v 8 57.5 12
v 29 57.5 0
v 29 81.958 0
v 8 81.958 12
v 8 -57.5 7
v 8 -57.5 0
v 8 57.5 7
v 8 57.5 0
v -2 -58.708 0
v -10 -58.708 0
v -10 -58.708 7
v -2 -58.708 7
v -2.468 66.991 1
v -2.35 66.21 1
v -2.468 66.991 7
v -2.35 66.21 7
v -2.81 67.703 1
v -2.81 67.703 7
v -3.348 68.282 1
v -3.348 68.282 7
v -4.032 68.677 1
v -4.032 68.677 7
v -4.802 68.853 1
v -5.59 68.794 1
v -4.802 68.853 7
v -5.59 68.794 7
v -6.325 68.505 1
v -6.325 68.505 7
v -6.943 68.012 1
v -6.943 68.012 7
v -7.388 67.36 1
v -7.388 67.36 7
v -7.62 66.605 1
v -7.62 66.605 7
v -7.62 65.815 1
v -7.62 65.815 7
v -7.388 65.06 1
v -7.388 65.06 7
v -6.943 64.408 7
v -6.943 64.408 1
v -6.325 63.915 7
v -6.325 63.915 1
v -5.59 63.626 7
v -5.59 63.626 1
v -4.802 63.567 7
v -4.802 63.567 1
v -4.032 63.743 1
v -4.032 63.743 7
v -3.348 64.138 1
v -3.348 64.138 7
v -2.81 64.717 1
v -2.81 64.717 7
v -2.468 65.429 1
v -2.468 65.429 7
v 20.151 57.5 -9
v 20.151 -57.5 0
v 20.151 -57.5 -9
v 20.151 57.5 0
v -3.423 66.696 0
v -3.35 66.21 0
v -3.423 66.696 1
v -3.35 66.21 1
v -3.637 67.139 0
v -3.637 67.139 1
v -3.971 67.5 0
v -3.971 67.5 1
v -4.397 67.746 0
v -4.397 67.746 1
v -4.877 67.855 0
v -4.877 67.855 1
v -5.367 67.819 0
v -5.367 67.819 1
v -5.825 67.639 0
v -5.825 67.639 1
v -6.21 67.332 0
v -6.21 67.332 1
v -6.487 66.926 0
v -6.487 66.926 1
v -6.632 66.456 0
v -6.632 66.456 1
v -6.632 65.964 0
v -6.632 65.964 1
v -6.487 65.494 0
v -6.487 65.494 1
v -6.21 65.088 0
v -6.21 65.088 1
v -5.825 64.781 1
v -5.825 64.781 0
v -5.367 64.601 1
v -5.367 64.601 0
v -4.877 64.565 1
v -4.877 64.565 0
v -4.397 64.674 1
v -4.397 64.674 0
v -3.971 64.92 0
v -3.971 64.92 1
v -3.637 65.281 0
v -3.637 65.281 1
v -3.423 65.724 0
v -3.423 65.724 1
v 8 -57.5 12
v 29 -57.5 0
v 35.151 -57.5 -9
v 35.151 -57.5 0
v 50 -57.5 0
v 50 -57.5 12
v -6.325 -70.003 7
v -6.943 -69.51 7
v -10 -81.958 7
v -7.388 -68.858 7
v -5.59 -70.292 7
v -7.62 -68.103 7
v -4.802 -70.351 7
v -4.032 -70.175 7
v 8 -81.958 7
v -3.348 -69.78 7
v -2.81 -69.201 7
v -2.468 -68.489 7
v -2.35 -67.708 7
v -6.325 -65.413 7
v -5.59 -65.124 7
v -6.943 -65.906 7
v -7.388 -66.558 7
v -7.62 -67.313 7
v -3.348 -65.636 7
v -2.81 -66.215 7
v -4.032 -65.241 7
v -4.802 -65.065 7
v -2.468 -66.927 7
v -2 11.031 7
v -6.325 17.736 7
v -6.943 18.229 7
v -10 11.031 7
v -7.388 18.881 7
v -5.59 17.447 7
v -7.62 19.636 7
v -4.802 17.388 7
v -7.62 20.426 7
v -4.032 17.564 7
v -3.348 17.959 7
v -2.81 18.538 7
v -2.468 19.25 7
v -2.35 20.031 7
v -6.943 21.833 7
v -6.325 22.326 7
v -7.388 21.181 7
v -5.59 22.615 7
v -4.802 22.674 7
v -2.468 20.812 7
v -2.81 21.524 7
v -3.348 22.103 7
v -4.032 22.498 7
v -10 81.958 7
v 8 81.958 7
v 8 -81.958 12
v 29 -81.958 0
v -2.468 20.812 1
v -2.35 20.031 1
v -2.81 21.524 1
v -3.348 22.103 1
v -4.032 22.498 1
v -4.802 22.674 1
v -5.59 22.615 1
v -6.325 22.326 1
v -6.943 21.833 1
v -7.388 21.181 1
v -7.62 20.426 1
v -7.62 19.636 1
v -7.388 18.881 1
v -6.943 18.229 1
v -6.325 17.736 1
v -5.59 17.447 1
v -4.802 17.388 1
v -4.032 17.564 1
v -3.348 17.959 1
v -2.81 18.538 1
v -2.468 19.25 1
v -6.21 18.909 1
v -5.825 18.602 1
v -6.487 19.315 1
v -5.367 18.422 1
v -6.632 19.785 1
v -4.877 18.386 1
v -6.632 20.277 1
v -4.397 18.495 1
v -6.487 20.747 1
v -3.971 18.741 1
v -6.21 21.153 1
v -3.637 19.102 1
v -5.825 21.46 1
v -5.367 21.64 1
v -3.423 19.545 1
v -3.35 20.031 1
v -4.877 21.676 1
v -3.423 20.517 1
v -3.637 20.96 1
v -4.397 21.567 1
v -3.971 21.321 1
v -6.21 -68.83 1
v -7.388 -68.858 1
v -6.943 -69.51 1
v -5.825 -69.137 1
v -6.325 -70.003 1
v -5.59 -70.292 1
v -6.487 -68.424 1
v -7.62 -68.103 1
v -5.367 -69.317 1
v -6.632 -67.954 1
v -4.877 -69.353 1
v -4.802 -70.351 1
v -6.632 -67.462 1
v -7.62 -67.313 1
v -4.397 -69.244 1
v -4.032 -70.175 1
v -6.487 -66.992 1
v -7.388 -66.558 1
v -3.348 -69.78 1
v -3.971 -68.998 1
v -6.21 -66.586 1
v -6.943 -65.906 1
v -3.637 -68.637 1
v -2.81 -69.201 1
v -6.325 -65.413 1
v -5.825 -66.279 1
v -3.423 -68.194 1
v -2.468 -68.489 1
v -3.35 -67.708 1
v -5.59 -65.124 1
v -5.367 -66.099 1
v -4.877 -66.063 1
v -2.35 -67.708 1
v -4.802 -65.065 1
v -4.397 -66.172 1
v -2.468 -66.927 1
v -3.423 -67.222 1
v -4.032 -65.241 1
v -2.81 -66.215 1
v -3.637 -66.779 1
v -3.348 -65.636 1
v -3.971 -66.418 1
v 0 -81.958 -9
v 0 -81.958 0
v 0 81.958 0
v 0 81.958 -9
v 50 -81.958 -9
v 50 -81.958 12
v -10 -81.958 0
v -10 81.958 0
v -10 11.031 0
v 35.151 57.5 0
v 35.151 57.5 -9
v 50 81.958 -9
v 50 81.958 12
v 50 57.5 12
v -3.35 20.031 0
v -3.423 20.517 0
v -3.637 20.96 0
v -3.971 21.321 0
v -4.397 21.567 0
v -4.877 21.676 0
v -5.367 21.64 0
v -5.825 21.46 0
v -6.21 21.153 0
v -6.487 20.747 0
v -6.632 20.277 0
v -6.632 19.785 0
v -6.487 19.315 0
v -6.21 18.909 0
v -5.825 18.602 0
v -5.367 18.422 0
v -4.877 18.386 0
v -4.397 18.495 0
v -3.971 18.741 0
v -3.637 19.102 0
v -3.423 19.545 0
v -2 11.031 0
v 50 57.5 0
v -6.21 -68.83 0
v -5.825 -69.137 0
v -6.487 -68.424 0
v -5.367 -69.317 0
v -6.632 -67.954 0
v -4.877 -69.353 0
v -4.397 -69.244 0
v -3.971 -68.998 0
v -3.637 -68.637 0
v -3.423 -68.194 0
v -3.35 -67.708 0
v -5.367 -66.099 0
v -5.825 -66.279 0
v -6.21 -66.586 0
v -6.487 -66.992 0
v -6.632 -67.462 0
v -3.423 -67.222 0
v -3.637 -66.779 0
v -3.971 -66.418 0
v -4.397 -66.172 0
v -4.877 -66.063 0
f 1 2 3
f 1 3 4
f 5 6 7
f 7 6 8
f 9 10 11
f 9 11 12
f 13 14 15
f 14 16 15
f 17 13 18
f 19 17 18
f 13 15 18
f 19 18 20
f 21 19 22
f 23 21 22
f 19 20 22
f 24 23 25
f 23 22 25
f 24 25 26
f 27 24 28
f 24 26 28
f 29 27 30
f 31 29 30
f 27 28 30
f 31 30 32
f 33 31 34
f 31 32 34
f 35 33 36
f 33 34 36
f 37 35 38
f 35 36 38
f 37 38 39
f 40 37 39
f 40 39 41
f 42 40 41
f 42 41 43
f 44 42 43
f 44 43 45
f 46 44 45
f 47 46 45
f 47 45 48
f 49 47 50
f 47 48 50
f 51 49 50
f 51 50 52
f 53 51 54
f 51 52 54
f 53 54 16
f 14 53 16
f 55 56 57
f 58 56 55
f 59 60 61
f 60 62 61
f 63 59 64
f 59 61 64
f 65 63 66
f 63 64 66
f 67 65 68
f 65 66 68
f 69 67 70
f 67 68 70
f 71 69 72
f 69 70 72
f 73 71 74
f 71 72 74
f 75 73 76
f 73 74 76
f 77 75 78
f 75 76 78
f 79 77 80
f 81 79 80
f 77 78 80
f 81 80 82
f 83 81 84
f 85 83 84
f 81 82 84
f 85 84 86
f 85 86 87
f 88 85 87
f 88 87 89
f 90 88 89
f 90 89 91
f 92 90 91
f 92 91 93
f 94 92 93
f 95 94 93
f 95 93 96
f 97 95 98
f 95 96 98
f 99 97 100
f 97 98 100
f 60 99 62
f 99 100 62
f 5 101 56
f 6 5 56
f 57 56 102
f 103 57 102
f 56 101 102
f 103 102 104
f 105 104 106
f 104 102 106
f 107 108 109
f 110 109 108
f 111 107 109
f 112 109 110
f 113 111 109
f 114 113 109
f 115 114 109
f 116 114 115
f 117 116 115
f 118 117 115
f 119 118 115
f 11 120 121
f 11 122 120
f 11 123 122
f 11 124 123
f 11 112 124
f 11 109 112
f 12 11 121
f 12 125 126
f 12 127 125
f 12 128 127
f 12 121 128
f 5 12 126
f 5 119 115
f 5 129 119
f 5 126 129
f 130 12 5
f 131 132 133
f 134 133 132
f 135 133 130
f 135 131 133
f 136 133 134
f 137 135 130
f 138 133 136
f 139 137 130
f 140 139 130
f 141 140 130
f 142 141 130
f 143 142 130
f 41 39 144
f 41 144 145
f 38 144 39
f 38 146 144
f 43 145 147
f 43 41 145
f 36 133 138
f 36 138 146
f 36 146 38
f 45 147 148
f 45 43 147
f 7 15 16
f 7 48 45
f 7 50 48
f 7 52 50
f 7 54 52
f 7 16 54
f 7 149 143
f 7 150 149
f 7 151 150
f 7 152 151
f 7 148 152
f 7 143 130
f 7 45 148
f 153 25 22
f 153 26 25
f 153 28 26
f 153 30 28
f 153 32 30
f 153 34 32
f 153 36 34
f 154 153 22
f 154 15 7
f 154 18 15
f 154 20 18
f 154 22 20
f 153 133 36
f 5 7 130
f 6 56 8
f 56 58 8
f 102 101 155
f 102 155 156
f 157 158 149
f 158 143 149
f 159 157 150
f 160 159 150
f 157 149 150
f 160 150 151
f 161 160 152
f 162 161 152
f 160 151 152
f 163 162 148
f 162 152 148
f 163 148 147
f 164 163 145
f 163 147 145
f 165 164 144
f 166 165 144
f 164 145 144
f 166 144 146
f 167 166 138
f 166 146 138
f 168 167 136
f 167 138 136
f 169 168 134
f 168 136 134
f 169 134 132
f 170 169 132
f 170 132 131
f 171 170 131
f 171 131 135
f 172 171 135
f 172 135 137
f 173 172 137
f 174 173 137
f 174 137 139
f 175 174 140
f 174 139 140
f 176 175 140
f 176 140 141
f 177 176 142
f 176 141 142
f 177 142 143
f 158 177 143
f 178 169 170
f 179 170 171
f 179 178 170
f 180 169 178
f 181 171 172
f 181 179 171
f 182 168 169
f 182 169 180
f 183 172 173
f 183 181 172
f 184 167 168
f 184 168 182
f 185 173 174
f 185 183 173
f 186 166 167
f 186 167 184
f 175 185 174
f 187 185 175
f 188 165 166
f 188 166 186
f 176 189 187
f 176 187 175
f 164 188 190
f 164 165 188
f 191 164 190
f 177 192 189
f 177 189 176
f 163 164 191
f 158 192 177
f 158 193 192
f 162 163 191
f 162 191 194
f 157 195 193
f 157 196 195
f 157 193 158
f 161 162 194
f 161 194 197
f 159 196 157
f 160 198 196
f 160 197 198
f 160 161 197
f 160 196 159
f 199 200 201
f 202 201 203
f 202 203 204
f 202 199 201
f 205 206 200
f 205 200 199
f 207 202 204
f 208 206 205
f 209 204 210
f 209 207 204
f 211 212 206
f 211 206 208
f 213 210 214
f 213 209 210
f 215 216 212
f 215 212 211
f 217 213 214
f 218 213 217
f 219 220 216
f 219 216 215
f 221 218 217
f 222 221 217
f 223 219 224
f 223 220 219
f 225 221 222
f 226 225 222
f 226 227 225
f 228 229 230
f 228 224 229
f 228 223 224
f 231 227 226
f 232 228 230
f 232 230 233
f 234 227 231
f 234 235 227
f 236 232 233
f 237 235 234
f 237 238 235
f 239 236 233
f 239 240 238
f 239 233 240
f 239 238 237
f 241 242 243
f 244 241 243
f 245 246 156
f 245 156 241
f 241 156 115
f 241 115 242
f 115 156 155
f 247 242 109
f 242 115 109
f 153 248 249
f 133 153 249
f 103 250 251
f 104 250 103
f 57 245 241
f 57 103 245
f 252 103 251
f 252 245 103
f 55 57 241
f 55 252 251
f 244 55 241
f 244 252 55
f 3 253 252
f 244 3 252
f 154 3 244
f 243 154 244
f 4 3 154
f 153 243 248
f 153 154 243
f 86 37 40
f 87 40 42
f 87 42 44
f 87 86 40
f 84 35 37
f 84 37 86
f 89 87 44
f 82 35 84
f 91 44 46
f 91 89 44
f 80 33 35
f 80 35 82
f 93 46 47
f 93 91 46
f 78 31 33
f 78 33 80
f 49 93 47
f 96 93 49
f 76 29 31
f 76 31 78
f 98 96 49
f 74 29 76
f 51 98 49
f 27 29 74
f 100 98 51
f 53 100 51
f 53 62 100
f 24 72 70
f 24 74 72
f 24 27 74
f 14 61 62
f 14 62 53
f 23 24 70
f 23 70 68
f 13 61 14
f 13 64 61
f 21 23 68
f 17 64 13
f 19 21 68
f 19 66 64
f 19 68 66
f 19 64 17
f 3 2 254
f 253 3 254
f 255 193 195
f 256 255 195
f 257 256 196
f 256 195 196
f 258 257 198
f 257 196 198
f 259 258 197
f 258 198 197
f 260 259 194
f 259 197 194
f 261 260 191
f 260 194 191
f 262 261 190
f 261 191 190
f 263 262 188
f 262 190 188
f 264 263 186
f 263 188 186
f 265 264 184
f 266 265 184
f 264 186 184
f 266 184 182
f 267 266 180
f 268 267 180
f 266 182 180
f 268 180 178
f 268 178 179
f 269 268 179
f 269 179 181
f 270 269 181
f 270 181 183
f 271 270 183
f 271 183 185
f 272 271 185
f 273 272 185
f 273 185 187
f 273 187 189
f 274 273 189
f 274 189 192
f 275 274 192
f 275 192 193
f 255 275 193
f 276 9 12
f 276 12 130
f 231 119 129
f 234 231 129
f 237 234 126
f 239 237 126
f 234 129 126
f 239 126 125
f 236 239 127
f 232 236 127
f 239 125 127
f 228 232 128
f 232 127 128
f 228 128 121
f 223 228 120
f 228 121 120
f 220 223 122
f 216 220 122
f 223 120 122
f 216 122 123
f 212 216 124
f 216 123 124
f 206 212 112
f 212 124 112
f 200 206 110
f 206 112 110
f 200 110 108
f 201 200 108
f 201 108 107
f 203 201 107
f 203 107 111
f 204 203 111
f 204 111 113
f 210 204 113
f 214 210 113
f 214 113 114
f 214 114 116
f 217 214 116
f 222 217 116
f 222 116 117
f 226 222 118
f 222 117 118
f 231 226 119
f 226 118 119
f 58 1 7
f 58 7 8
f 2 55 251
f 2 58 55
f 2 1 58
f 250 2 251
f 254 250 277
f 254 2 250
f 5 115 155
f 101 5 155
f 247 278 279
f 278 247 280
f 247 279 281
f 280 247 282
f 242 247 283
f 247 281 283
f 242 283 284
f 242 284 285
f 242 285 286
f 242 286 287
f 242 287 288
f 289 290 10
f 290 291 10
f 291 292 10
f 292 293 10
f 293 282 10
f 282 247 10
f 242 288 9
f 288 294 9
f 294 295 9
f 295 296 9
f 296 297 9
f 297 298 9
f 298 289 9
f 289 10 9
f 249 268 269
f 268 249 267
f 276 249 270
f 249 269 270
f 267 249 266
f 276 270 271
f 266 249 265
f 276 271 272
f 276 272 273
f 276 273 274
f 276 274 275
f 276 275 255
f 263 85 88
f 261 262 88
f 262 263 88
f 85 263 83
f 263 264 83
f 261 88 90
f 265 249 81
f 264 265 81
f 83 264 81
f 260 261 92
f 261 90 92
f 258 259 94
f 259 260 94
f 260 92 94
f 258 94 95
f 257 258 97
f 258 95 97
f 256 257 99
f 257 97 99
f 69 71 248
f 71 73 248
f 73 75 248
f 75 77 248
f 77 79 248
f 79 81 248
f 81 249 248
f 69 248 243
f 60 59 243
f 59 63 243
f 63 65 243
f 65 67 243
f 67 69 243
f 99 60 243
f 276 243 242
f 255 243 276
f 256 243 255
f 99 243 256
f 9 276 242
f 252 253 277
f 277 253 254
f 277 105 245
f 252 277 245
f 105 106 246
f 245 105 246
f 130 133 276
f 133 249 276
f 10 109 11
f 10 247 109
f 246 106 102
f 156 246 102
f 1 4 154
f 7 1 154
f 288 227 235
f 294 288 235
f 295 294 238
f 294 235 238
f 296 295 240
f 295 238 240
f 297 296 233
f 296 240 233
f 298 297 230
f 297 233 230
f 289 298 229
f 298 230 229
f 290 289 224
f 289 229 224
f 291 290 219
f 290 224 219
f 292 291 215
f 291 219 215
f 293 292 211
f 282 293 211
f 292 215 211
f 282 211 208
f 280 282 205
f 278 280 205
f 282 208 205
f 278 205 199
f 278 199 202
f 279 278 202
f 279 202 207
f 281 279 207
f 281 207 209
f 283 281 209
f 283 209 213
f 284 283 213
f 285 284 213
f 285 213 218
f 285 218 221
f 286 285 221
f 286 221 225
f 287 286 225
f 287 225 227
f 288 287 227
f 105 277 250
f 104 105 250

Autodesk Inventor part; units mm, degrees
ref_plane "YZ Plane" through (0, 0, 0) normal (1, 0, 0) x (0, 1, 0)
ref_plane "XZ Plane" through (0, 0, 0) normal (0, 1, 0) x (-1, 0, 0)
ref_plane "XY Plane" through (0, 0, 0) normal (0, 0, 1) x (1, 0, 0)
sketch "Sketch1" plane through (0, 0, 0) normal (0, 0, 1) x (1, 0, 0)
  line L0 (0, 0) -> (0, 81.958)
  line L1 (0, 0) -> (0, -81.958)
  line L2 (0, -81.958) -> (-10, -81.958)
  line L3 (-5, -81.958) -> (-5, -67.708) construction
  line L4 (-5, -67.708) -> (-5, -58.708) construction
  line L5 (-10, -81.958) -> (-10, -58.708)
  line L6 (-10, -58.708) -> (0, -58.708)
  line L7 (0, 81.958) -> (-10, 81.958)
  line L8 (-5, 81.958) -> (-5, 66.21) construction
  line L9 (-5, 66.21) -> (-5, 20.031) construction
  line L10 (-5, 20.031) -> (-5, 11.031) construction
  line L11 (-10, 81.958) -> (-10, 11.031)
  line L12 (-10, 11.031) -> (0, 11.031)
  line L13 (0, -58.708) -> (-2, -58.708)
  line L14 (-2, -58.708) -> (-2, 11.031)
  line L15 (0, -81.958) -> (8, -81.958)
  line L16 (8, -81.958) -> (8, 81.958)
  line L17 (8, 81.958) -> (0, 81.958)
  line L18 (0, 81.958) -> (0, -81.958)
  dimension "d0" = 81.958
  dimension "d2" = 163.916
  dimension "d3" = 10
  dimension "d4" = 14.25
  dimension "d5" = 9
  dimension "d6" = 15.748
  dimension "d7" = 46.179
  dimension "d8" = 9
  dimension "d9" = 2
  dimension "d10" = 8
extrude "Extrusion1" add sketch "Sketch1" along normal blind 7
sketch "Sketch2" plane through (0, 0, 0) normal (0, 0, -1) x (-1, 0, 0)
  line L0 (10, 81.958) -> (10, 11.031) construction
  line L1 (10, 46.4945) -> (0, 46.4945) construction
  line L2 (-8, 81.958) -> (10, 81.958) projected
  line L3 (0, 81.958) -> (-50, 81.958)
  line L4 (-50, 81.958) -> (-50, -81.958)
  line L5 (-50, -81.958) -> (0, -81.958)
  line L6 (0, -81.958) -> (0, 81.958)
  line L7 (-35.1508, -57.5) -> (-20.1508, -57.5)
  line L8 (-20.1508, -57.5) -> (-20.1508, 57.5)
  line L9 (-20.1508, 57.5) -> (-35.1508, 57.5)
  line L10 (-35.1508, 57.5) -> (-35.1508, -57.5)
  line L11 (-35.1508, -57.5) -> (-20.1508, 57.5) construction
  line L12 (-20.1508, -57.5) -> (-35.1508, 57.5) construction
  point P0 (0, 0)
  point P1 (-27.6508, 0)
  dimension "d13" = 10
  dimension "d14" = 50
  dimension "d15" = 15
  dimension "d16" = 115
extrude "Extrusion2" add sketch "Sketch2" along normal blind 9
sketch "Sketch3" plane through (-10, -81.958, 7) normal (0, -1, 0) x (1, 0, 0)
  line L0 (60, -7) -> (18, -7) projected
  line L1 (60, -7) -> (60, 5)
  line L2 (0, 0) -> (18, 0) projected
  line L3 (18, 5) -> (18, 0)
  line L4 (60, 5) -> (39, -7)
  line L5 (18, 5) -> (39, -7)
  line L6 (18, -7) -> (18, 0) projected
  line L7 (18, 0) -> (18, -7)
  point P0 (10, -7)
  dimension "d19" = 12
extrude "Extrusion3" add sketch "Sketch3" against normal up to surface (24.458 mm away)
mirror "Mirror1" about plane through (0, 0, 0) normal (0, 1, 0) of "Extrusion3"
sketch "Sketch4" plane through (0, 0, 7) normal (0, 0, 1) x (1, 0, 0)
  line L0 (-5, -81.958) -> (-5, -67.708) construction
  line L1 (-5, 81.958) -> (-5, 66.21) construction
  line L2 (-5, 66.21) -> (-5, 20.031) construction
  circle A0 centre (-5, -67.708) radius 1.65
  circle A1 centre (-5, 20.031) radius 1.65
  circle A2 centre (-5, 66.21) radius 1.65
  point P0 (0, 0)
  dimension "d22" = 14.25
  dimension "d23" = 46.179
  dimension "d24" = 15.748
  dimension "d25" = 3.3
extrude "Extrusion4" cut sketch "Sketch4" against normal up to surface (7 mm away)
sketch "Sketch5" plane through (0, 0, 7) normal (0, 0, 1) x (1, 0, 0)
  circle A0 centre (-5, -67.708) radius 1.65 projected
  circle A1 centre (-5, -67.708) radius 2.65
  circle A2 centre (-5, 20.031) radius 1.65 projected
  circle A3 centre (-5, 20.031) radius 2.65
  circle A4 centre (-5, 66.21) radius 1.65 projected
  circle A5 centre (-5, 66.21) radius 2.65
  point P0 (0, 0)
  dimension "d28" = 5.3
extrude "Extrusion5" cut sketch "Sketch5" against normal blind 6 contours A0 | A1 | A2 | A3 | A4 | A5
properties part number "Base Extension 2"
